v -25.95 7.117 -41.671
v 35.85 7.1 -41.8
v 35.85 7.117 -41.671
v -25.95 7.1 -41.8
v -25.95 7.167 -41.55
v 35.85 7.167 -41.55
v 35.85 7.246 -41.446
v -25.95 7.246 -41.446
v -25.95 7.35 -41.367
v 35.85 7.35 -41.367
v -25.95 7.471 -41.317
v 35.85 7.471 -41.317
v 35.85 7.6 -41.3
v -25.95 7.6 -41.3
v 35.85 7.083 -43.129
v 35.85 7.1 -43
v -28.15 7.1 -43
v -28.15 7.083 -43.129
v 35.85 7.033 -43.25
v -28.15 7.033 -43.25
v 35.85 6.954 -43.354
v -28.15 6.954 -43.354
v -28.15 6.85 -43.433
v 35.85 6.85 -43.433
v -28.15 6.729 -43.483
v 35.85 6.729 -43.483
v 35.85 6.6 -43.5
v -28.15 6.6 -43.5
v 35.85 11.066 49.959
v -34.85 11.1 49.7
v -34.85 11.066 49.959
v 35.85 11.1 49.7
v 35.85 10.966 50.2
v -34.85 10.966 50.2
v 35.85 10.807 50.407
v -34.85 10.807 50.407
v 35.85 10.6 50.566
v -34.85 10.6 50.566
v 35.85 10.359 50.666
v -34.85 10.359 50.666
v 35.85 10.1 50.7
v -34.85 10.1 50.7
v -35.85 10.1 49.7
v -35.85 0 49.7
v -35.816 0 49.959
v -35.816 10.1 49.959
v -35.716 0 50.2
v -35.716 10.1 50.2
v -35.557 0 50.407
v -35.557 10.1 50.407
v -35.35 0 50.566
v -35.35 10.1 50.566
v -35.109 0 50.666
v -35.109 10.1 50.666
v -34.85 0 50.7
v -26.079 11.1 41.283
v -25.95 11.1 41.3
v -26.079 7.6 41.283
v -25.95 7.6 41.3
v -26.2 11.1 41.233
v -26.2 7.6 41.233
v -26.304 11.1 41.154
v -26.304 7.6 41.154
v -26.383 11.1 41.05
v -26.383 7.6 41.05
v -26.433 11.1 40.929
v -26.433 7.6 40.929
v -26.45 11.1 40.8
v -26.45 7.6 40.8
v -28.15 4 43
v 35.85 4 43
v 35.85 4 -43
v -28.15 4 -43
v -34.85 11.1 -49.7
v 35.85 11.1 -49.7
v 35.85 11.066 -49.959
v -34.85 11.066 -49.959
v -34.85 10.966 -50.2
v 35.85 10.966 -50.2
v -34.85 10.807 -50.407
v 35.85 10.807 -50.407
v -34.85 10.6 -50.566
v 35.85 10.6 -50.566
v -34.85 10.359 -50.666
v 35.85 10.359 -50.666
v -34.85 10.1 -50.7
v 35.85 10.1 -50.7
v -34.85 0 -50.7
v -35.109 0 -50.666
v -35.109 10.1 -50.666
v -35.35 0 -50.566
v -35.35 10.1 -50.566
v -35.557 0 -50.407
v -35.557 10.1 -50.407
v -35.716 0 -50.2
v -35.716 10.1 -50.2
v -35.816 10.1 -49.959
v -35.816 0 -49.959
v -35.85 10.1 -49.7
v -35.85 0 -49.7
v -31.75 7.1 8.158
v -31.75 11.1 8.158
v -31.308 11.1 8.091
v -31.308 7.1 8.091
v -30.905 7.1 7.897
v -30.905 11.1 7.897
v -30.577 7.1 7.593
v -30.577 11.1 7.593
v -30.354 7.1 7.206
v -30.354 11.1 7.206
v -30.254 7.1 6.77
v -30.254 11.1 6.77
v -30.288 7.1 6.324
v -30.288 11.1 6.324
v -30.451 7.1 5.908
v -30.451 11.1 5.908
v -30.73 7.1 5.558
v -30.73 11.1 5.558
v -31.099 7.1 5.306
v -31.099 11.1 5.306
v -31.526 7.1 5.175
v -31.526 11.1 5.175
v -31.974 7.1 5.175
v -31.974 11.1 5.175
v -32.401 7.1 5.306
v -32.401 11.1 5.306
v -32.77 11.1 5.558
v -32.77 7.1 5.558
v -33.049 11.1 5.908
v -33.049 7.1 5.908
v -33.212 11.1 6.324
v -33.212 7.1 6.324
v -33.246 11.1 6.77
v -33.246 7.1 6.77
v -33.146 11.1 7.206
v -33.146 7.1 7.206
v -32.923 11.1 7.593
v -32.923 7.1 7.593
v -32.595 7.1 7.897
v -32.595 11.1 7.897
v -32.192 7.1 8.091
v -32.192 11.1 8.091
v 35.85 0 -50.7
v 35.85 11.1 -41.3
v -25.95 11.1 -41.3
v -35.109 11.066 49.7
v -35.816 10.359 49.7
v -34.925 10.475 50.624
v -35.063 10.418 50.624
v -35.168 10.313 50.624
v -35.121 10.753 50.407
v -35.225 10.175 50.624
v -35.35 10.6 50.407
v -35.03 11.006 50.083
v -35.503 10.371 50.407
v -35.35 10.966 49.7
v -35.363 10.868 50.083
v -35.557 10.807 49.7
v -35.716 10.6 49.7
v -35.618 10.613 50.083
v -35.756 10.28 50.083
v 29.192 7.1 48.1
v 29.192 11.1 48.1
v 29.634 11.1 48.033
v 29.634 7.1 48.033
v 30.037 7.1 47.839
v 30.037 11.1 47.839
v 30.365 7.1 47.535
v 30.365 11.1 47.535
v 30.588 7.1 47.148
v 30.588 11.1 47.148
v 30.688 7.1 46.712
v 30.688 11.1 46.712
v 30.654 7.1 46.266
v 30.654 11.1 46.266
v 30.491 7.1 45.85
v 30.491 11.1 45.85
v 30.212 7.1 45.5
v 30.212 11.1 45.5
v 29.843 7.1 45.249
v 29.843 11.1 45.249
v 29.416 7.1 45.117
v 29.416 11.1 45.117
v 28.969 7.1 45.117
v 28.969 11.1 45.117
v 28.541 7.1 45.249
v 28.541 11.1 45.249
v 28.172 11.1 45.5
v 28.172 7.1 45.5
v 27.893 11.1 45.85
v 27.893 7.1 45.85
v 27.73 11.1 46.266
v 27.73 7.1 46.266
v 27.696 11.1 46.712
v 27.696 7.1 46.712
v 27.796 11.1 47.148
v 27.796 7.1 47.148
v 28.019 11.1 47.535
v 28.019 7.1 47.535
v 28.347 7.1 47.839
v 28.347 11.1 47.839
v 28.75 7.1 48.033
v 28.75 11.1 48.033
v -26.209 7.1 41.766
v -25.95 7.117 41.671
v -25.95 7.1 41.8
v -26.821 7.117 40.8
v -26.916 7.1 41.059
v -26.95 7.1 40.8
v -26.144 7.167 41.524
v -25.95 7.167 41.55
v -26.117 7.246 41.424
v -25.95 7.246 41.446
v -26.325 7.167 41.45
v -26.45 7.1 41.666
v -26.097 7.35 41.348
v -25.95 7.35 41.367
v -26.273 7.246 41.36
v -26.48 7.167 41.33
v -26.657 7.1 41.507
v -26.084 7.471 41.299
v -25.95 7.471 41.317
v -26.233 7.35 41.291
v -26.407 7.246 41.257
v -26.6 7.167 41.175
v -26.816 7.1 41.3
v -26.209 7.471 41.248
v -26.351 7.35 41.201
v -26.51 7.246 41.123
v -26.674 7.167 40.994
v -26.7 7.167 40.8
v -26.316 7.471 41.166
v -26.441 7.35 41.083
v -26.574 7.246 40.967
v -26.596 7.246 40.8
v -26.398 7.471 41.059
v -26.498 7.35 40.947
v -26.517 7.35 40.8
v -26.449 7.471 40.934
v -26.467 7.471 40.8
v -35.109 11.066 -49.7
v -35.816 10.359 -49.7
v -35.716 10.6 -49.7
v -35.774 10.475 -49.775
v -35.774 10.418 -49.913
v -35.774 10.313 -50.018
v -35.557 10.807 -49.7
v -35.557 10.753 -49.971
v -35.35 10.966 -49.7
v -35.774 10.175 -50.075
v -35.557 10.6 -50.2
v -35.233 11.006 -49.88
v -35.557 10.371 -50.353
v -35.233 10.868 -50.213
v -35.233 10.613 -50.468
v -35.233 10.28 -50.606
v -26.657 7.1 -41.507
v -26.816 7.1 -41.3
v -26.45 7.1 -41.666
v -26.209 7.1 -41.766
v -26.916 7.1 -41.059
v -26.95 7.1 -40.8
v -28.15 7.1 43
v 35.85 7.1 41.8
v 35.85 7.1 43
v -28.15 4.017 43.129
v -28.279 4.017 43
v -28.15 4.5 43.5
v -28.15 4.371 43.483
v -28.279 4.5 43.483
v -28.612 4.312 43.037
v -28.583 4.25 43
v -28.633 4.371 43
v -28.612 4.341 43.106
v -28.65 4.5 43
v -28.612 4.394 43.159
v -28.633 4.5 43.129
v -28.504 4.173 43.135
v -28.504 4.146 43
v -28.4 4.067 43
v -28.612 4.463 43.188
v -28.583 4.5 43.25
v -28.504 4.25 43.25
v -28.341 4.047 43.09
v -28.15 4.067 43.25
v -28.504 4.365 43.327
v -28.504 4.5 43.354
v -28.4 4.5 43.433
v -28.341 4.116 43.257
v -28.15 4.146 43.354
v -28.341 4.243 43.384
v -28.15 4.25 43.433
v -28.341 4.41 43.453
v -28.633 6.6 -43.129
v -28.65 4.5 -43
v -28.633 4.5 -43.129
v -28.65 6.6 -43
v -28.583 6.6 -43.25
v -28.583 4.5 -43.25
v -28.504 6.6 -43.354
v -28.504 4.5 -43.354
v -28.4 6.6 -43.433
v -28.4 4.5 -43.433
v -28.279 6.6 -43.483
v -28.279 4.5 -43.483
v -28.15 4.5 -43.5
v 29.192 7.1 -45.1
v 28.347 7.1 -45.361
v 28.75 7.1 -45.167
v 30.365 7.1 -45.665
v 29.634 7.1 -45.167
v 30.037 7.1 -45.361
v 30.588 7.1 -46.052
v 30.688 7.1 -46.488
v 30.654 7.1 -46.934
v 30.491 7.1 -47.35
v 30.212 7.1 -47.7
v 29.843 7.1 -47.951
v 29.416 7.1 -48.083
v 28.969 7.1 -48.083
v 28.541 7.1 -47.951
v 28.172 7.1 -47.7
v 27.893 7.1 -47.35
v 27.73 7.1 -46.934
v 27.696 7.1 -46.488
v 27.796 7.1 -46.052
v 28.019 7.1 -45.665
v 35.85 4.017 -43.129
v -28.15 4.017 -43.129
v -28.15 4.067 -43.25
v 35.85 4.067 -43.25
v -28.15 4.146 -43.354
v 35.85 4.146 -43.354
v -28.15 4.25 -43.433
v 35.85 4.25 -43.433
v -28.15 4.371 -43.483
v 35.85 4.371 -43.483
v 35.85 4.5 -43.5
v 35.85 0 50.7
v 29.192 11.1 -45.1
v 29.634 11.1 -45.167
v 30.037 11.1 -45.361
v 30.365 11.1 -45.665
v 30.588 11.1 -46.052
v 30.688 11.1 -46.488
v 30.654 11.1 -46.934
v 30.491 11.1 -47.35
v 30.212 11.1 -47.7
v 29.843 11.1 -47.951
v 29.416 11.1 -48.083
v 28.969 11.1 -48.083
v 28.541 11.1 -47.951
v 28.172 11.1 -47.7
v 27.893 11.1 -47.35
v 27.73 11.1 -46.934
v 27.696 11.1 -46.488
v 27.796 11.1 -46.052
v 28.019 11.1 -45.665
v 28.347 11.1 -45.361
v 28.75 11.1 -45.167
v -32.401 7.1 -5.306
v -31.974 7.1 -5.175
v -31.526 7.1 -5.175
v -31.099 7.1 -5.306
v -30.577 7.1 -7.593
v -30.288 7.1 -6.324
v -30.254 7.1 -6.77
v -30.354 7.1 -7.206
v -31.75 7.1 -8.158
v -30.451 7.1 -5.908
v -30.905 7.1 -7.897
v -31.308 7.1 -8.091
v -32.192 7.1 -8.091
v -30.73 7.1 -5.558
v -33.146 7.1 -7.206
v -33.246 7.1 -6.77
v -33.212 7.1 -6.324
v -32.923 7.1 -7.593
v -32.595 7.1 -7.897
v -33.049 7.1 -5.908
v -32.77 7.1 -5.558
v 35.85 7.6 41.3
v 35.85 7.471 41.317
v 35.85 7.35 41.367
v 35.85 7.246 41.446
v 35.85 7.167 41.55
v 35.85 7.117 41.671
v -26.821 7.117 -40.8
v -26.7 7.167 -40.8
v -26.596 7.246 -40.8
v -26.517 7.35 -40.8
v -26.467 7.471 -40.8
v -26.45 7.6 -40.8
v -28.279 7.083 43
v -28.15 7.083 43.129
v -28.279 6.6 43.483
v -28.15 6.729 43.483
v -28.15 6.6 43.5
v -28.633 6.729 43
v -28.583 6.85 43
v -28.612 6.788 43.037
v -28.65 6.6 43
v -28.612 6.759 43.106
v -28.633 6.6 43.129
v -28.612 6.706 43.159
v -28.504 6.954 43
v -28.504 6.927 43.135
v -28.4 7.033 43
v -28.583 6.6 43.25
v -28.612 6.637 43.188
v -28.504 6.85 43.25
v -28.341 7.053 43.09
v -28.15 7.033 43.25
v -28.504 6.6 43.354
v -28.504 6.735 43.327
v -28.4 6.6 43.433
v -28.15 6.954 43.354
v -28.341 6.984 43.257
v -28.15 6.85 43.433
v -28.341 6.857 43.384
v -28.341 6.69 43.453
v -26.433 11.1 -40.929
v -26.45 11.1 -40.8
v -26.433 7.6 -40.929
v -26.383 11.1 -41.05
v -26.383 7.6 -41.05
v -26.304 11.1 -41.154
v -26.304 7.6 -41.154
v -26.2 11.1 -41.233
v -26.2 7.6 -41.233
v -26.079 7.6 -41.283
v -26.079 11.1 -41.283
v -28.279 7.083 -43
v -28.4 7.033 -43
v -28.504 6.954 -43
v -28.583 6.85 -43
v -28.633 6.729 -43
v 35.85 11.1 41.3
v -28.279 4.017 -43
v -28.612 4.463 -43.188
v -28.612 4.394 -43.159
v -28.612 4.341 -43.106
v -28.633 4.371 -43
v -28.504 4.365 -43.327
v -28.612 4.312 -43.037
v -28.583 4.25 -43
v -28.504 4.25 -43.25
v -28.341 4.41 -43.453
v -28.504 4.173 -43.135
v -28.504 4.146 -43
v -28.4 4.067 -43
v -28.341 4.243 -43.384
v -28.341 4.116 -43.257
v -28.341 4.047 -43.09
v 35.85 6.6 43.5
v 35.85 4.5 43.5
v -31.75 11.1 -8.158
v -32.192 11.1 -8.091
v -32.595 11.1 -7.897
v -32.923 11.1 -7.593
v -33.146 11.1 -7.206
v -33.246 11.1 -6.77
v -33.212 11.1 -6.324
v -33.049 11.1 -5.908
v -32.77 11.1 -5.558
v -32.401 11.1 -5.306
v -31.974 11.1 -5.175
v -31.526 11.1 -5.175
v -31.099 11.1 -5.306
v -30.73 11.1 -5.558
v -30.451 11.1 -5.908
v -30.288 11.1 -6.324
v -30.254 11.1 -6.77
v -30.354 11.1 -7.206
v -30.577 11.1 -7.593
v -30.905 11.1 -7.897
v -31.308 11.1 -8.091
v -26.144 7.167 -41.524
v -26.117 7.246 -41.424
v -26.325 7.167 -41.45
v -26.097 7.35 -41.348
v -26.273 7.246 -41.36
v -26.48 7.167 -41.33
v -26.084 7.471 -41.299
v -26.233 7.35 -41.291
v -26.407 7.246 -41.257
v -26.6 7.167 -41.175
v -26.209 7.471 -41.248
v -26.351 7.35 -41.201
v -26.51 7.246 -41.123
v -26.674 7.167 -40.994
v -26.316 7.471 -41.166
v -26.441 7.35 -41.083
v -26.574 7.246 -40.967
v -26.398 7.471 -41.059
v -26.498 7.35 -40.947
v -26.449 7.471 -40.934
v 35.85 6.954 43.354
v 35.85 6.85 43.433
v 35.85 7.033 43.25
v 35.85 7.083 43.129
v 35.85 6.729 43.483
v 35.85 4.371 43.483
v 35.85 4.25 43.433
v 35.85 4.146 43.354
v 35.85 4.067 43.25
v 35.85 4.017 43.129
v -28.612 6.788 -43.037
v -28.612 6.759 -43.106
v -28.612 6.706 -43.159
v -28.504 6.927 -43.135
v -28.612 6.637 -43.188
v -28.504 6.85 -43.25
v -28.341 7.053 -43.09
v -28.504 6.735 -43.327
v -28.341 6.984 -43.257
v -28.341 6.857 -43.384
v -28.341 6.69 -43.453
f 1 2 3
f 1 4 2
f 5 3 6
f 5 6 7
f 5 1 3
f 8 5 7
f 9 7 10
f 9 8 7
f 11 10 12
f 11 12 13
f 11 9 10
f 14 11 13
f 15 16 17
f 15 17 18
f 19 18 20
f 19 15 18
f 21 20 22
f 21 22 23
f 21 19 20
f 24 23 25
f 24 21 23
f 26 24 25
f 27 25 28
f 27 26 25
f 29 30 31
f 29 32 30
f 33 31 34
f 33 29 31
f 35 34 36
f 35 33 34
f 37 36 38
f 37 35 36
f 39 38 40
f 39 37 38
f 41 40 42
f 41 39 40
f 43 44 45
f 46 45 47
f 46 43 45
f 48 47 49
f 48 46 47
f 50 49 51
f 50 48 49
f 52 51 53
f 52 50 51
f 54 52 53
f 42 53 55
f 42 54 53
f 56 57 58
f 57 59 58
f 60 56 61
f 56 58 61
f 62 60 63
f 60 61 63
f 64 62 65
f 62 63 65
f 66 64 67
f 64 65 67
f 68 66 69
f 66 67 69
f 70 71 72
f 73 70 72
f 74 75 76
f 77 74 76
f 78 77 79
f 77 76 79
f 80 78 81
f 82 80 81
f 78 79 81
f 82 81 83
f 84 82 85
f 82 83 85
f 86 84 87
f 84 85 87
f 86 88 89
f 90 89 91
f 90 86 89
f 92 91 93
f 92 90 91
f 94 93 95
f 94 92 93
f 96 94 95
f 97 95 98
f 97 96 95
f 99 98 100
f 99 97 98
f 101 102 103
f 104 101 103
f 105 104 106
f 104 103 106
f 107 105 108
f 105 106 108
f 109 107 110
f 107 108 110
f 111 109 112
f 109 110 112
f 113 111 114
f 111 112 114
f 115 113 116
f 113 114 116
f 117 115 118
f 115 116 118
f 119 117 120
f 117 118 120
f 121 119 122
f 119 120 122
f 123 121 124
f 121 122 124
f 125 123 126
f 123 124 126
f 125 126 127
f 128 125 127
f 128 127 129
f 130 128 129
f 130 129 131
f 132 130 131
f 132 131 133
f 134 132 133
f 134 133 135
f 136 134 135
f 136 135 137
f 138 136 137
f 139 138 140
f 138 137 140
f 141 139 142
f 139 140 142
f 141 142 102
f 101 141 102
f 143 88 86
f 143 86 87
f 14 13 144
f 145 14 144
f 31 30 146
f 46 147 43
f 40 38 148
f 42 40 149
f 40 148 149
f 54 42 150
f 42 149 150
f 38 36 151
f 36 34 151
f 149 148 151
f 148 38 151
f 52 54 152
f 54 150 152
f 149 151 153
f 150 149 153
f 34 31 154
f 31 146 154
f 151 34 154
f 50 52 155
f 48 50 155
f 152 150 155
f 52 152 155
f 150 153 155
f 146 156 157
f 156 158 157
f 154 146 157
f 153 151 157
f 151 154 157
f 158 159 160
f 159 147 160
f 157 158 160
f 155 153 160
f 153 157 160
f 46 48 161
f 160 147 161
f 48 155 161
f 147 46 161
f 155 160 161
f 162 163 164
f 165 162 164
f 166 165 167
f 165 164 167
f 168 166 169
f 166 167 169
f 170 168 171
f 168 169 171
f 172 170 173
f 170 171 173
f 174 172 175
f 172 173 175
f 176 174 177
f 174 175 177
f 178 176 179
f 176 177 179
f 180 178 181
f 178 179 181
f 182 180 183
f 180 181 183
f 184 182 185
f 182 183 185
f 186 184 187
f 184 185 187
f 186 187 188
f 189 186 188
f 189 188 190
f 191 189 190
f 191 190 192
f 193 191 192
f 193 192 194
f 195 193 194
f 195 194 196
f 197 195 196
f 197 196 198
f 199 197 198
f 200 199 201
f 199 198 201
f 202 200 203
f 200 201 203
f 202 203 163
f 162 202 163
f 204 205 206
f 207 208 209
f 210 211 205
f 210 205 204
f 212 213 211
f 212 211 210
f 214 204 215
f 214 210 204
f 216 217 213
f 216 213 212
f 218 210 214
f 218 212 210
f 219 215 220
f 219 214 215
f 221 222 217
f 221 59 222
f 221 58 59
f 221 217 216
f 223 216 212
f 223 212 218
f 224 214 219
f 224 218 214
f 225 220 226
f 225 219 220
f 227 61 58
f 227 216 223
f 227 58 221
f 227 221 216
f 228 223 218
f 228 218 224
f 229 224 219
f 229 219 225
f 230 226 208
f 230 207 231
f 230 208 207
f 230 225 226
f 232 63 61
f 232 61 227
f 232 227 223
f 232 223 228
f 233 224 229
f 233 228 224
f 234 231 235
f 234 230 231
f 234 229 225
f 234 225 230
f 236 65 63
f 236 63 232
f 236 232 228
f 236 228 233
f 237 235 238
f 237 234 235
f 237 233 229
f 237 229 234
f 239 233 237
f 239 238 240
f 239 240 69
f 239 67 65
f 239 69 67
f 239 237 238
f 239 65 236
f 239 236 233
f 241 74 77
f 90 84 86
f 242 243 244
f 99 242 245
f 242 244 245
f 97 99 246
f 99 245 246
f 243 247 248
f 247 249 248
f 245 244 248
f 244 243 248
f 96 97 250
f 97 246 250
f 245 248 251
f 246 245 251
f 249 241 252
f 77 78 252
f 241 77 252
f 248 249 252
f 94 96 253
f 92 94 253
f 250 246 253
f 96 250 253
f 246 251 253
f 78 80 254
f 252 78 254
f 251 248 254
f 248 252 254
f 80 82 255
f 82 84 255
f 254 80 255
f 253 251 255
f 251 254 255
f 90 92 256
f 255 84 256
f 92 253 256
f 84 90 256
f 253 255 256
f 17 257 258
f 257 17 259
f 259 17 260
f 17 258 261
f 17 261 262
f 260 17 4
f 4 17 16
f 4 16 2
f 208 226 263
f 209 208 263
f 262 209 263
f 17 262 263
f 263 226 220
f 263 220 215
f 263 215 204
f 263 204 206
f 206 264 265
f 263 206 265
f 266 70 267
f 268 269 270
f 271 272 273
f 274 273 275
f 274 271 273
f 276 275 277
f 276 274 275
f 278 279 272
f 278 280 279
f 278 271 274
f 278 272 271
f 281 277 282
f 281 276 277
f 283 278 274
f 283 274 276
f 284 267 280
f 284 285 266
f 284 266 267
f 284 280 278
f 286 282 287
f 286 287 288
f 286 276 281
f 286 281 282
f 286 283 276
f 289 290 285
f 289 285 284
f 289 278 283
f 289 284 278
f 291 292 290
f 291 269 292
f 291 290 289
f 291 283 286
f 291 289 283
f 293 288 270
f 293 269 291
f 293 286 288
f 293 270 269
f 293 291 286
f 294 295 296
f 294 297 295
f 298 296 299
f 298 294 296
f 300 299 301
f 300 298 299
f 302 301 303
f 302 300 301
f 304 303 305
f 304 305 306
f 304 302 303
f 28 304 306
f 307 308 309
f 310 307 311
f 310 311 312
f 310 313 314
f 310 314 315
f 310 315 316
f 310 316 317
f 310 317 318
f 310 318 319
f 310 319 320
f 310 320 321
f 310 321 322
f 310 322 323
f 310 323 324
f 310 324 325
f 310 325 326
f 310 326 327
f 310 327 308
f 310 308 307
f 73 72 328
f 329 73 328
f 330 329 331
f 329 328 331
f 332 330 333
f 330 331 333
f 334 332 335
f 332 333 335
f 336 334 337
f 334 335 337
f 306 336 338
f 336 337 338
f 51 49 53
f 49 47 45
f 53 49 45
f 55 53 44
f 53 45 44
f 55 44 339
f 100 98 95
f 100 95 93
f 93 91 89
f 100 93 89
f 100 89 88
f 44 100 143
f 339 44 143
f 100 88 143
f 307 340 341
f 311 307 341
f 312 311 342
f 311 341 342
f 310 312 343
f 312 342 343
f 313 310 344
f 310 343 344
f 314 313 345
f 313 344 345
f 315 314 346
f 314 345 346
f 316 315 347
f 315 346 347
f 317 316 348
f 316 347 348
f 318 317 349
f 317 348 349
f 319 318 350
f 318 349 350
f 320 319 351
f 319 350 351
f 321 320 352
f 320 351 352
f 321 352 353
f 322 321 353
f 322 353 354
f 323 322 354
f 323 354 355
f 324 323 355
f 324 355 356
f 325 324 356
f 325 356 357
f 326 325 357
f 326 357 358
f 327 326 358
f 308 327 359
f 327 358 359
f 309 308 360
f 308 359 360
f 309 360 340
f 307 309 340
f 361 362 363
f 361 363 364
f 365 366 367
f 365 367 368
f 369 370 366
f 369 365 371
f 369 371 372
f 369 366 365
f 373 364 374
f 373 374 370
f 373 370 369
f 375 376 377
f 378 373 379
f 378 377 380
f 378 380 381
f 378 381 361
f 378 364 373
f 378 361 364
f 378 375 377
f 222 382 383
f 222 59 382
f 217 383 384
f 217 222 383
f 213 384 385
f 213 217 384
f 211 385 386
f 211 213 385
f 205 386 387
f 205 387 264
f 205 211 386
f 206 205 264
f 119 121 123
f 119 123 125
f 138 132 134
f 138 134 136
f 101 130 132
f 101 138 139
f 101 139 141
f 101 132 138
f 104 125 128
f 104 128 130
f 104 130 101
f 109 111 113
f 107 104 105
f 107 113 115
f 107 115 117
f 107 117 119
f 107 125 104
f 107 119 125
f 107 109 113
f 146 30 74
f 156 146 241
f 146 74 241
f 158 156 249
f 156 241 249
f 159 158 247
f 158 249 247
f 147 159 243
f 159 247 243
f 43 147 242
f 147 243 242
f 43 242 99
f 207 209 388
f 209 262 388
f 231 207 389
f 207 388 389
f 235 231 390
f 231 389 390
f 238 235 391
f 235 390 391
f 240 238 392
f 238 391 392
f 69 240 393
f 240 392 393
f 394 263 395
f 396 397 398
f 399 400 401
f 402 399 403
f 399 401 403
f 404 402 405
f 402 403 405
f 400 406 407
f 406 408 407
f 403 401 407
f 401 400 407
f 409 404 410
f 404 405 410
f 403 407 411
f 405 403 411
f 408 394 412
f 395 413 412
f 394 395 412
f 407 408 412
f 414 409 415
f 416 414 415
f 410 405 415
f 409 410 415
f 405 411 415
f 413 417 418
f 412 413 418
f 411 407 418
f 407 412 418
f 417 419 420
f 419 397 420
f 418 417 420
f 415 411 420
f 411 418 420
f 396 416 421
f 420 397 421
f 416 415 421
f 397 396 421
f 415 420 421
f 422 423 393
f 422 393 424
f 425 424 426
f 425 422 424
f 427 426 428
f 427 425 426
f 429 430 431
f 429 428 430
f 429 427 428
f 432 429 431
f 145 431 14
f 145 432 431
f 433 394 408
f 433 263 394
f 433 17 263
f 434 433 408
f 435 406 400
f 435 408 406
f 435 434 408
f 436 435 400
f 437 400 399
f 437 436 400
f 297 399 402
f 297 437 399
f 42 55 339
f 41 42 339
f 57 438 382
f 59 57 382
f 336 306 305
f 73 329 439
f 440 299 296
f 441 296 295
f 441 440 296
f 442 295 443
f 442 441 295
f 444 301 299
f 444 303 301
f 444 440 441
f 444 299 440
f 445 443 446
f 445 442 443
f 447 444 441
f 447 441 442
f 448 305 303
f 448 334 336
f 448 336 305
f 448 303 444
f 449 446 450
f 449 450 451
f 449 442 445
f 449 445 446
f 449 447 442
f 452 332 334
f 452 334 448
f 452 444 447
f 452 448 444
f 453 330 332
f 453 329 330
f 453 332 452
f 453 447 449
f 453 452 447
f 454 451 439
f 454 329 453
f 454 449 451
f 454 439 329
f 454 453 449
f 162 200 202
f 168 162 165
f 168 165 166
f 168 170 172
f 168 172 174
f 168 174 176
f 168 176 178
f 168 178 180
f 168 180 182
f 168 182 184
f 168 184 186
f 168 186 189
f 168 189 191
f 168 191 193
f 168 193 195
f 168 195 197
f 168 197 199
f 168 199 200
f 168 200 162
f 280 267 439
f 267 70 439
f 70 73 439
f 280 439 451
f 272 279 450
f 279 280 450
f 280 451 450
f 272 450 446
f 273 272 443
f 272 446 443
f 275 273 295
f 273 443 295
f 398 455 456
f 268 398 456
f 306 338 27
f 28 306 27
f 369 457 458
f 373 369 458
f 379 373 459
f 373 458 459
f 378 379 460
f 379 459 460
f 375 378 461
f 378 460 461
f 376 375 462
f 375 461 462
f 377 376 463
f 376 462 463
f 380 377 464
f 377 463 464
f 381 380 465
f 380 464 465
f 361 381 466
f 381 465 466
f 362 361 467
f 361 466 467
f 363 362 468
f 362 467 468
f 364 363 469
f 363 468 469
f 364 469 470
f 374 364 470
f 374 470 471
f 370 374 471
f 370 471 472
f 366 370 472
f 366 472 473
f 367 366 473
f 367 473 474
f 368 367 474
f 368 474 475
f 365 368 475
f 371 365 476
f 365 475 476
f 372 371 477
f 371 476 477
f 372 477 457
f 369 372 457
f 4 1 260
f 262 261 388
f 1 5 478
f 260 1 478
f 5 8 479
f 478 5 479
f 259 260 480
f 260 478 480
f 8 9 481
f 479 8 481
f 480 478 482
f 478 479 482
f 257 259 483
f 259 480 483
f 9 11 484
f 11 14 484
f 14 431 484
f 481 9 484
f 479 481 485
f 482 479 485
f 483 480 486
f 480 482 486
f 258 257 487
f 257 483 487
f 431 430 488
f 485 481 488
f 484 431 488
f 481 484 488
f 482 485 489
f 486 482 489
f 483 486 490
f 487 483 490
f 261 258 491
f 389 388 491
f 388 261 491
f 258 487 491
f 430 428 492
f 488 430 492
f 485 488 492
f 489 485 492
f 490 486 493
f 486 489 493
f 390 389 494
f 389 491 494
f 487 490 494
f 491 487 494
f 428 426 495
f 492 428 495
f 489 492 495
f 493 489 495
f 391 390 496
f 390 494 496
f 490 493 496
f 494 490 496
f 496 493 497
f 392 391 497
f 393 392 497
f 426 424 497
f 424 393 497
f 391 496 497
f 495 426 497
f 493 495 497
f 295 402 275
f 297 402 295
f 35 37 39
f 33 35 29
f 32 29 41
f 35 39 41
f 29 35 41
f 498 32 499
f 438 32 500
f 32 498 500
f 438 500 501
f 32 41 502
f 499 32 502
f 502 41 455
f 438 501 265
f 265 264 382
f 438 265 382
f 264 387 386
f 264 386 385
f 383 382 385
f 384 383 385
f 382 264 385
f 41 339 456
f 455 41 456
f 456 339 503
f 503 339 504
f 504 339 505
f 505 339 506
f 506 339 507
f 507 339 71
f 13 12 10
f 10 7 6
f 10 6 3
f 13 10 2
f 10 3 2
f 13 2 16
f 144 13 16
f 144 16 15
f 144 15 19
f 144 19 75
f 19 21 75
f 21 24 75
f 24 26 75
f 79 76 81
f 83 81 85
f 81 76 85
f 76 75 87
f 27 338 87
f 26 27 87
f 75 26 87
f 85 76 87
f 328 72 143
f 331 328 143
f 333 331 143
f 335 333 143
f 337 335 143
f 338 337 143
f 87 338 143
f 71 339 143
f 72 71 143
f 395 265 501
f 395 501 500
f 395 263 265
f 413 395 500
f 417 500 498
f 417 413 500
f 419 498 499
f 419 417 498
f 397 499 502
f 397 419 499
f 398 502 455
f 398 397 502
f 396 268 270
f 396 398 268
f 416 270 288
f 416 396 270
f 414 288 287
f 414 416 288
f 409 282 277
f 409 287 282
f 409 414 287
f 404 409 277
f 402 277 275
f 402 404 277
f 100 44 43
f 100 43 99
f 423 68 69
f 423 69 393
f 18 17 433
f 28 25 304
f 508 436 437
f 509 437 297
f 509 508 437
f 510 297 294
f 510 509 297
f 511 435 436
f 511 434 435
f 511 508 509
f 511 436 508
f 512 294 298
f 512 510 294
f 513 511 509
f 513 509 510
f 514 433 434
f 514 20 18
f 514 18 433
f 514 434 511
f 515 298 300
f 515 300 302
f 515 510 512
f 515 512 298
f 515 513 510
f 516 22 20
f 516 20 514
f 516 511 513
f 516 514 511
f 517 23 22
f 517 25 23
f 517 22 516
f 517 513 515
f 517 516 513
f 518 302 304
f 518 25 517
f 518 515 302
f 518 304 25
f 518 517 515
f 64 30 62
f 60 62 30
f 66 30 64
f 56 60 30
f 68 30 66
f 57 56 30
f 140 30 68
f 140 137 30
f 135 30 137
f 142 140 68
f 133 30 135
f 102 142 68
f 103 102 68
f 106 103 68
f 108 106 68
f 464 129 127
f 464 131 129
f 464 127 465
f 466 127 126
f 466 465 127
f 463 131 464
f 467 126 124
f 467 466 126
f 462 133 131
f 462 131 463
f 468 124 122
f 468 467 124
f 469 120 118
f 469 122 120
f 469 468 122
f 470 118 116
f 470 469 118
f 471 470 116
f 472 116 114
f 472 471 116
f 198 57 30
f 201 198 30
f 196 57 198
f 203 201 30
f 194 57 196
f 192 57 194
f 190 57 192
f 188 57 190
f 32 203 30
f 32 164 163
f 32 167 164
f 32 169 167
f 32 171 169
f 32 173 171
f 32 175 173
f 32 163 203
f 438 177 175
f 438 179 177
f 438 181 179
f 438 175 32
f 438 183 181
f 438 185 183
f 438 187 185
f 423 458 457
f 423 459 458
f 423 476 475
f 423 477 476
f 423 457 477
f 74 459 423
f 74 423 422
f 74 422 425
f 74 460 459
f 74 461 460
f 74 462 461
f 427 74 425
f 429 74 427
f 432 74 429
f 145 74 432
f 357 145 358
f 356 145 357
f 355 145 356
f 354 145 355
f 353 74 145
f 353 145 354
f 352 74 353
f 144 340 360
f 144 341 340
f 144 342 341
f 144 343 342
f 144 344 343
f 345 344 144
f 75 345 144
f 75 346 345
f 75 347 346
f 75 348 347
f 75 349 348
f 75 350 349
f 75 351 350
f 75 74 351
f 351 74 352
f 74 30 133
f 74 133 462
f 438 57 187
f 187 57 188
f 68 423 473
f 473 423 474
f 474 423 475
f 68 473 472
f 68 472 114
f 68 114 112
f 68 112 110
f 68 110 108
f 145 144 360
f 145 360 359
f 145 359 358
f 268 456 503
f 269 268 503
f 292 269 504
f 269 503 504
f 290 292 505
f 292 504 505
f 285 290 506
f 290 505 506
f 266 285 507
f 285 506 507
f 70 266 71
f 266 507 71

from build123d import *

# Parameters (mm, degrees)
SKETCH1_W           = 71.7
SKETCH1_H           = 101.4
BOSS_EXTRUDE1_DEPTH = 11.1
CUT_EXTRUDE1_DEPTH  = 62.3
SKETCH6_W           = 87
SKETCH6_H           = 3.1
CUT_EXTRUDE2_DEPTH  = 2.2
FILLET1_R           = 0.5
FILLET2_R           = 1
SKETCH7_R           = 1.5
CUT_EXTRUDE3_DEPTH  = 4
SKETCH8_R           = 1.5
CUT_EXTRUDE4_DEPTH  = 4


with BuildPart() as part:
    # Sketch1 → Boss-Extrude1 (new body)
    with BuildSketch(Plane(origin=(0, 0, 0), x_dir=(1, 0, 0), z_dir=(0, 1, 0))):
        Rectangle(SKETCH1_W, SKETCH1_H)
    extrude(amount=BOSS_EXTRUDE1_DEPTH)

    # Sketch5 → Cut-Extrude1 (cut)
    with BuildSketch(Plane(origin=(35.85, 0, 0), x_dir=(0, 0, -1), z_dir=(1, 0, 0))):
        Polygon((-41.3, 18.36393321), (-41.3, 7.1), (-43.5, 7.1), (-43.5, 4), (43.5, 4), (43.5, 7.1), (41.3, 7.1), (41.3, 18.36393321), align=None)
    extrude(amount=-CUT_EXTRUDE1_DEPTH, mode=Mode.SUBTRACT)

    # Sketch6 → Cut-Extrude2 (cut)
    with BuildSketch(Plane(origin=(-26.45, 0, 0), x_dir=(0, 0, -1), z_dir=(1, 0, 0))):
        with Locations((0, 5.55)):
            Rectangle(SKETCH6_W, SKETCH6_H)
    extrude(amount=-CUT_EXTRUDE2_DEPTH, mode=Mode.SUBTRACT)

    # Fillet1
    fillet1_edges = [part.edges().sort_by_distance(p)[0] for p in [
        (-26.45, 9.1, -41.3),
        (4.7, 7.1, -41.3),
        (3.6, 7.1, -43.5),
        (3.6, 4, -43.5),
        (3.6, 4, 43.5),
        (3.6, 7.1, 43.5),
        (-26.45, 9.1, 41.3),
        (4.7, 7.1, 41.3),
        (-26.45, 7.1, 0),
        (-28.65, 7.1, 0),
        (-28.65, 5.55, -43.5),
        (-28.65, 4, 0),
        (-28.65, 5.55, 43.5),
    ]]
    fillet(fillet1_edges, radius=FILLET1_R)

    # Fillet2
    fillet2_edges = [part.edges().sort_by_distance(p)[0] for p in [
        (0, 11.1, -50.7),
        (-35.85, 11.1, 0),
        (0, 11.1, 50.7),
        (-35.85, 5.55, -50.7),
        (-35.85, 5.55, 50.7),
    ]]
    fillet(fillet2_edges, radius=FILLET2_R)

    # Sketch7 → Cut-Extrude3 (cut)
    with BuildSketch(Plane(origin=(0, 11.1, 0), x_dir=(1, 0, 0), z_dir=(0, 1, 0))):
        with Locations(Location((-31.75, -6.65790951, 0), (0, 0, 270))):
            Circle(SKETCH7_R)
        with Locations(Location((-31.75, 6.65790951, 0), (0, 0, 90))):
            Circle(SKETCH7_R)
    extrude(amount=-CUT_EXTRUDE3_DEPTH, mode=Mode.SUBTRACT)

    # Sketch8 → Cut-Extrude4 (cut)
    with BuildSketch(Plane(origin=(0, 11.1, 0), x_dir=(1, 0, 0), z_dir=(0, 1, 0))):
        with Locations(Location((29.19209049, -46.6, 0), (0, 0, 270))):
            Circle(SKETCH8_R)
        with Locations(Location((29.19209049, 46.6, 0), (0, 0, 270))):
            Circle(SKETCH8_R)
    extrude(amount=-CUT_EXTRUDE4_DEPTH, mode=Mode.SUBTRACT)


solid = part.part
